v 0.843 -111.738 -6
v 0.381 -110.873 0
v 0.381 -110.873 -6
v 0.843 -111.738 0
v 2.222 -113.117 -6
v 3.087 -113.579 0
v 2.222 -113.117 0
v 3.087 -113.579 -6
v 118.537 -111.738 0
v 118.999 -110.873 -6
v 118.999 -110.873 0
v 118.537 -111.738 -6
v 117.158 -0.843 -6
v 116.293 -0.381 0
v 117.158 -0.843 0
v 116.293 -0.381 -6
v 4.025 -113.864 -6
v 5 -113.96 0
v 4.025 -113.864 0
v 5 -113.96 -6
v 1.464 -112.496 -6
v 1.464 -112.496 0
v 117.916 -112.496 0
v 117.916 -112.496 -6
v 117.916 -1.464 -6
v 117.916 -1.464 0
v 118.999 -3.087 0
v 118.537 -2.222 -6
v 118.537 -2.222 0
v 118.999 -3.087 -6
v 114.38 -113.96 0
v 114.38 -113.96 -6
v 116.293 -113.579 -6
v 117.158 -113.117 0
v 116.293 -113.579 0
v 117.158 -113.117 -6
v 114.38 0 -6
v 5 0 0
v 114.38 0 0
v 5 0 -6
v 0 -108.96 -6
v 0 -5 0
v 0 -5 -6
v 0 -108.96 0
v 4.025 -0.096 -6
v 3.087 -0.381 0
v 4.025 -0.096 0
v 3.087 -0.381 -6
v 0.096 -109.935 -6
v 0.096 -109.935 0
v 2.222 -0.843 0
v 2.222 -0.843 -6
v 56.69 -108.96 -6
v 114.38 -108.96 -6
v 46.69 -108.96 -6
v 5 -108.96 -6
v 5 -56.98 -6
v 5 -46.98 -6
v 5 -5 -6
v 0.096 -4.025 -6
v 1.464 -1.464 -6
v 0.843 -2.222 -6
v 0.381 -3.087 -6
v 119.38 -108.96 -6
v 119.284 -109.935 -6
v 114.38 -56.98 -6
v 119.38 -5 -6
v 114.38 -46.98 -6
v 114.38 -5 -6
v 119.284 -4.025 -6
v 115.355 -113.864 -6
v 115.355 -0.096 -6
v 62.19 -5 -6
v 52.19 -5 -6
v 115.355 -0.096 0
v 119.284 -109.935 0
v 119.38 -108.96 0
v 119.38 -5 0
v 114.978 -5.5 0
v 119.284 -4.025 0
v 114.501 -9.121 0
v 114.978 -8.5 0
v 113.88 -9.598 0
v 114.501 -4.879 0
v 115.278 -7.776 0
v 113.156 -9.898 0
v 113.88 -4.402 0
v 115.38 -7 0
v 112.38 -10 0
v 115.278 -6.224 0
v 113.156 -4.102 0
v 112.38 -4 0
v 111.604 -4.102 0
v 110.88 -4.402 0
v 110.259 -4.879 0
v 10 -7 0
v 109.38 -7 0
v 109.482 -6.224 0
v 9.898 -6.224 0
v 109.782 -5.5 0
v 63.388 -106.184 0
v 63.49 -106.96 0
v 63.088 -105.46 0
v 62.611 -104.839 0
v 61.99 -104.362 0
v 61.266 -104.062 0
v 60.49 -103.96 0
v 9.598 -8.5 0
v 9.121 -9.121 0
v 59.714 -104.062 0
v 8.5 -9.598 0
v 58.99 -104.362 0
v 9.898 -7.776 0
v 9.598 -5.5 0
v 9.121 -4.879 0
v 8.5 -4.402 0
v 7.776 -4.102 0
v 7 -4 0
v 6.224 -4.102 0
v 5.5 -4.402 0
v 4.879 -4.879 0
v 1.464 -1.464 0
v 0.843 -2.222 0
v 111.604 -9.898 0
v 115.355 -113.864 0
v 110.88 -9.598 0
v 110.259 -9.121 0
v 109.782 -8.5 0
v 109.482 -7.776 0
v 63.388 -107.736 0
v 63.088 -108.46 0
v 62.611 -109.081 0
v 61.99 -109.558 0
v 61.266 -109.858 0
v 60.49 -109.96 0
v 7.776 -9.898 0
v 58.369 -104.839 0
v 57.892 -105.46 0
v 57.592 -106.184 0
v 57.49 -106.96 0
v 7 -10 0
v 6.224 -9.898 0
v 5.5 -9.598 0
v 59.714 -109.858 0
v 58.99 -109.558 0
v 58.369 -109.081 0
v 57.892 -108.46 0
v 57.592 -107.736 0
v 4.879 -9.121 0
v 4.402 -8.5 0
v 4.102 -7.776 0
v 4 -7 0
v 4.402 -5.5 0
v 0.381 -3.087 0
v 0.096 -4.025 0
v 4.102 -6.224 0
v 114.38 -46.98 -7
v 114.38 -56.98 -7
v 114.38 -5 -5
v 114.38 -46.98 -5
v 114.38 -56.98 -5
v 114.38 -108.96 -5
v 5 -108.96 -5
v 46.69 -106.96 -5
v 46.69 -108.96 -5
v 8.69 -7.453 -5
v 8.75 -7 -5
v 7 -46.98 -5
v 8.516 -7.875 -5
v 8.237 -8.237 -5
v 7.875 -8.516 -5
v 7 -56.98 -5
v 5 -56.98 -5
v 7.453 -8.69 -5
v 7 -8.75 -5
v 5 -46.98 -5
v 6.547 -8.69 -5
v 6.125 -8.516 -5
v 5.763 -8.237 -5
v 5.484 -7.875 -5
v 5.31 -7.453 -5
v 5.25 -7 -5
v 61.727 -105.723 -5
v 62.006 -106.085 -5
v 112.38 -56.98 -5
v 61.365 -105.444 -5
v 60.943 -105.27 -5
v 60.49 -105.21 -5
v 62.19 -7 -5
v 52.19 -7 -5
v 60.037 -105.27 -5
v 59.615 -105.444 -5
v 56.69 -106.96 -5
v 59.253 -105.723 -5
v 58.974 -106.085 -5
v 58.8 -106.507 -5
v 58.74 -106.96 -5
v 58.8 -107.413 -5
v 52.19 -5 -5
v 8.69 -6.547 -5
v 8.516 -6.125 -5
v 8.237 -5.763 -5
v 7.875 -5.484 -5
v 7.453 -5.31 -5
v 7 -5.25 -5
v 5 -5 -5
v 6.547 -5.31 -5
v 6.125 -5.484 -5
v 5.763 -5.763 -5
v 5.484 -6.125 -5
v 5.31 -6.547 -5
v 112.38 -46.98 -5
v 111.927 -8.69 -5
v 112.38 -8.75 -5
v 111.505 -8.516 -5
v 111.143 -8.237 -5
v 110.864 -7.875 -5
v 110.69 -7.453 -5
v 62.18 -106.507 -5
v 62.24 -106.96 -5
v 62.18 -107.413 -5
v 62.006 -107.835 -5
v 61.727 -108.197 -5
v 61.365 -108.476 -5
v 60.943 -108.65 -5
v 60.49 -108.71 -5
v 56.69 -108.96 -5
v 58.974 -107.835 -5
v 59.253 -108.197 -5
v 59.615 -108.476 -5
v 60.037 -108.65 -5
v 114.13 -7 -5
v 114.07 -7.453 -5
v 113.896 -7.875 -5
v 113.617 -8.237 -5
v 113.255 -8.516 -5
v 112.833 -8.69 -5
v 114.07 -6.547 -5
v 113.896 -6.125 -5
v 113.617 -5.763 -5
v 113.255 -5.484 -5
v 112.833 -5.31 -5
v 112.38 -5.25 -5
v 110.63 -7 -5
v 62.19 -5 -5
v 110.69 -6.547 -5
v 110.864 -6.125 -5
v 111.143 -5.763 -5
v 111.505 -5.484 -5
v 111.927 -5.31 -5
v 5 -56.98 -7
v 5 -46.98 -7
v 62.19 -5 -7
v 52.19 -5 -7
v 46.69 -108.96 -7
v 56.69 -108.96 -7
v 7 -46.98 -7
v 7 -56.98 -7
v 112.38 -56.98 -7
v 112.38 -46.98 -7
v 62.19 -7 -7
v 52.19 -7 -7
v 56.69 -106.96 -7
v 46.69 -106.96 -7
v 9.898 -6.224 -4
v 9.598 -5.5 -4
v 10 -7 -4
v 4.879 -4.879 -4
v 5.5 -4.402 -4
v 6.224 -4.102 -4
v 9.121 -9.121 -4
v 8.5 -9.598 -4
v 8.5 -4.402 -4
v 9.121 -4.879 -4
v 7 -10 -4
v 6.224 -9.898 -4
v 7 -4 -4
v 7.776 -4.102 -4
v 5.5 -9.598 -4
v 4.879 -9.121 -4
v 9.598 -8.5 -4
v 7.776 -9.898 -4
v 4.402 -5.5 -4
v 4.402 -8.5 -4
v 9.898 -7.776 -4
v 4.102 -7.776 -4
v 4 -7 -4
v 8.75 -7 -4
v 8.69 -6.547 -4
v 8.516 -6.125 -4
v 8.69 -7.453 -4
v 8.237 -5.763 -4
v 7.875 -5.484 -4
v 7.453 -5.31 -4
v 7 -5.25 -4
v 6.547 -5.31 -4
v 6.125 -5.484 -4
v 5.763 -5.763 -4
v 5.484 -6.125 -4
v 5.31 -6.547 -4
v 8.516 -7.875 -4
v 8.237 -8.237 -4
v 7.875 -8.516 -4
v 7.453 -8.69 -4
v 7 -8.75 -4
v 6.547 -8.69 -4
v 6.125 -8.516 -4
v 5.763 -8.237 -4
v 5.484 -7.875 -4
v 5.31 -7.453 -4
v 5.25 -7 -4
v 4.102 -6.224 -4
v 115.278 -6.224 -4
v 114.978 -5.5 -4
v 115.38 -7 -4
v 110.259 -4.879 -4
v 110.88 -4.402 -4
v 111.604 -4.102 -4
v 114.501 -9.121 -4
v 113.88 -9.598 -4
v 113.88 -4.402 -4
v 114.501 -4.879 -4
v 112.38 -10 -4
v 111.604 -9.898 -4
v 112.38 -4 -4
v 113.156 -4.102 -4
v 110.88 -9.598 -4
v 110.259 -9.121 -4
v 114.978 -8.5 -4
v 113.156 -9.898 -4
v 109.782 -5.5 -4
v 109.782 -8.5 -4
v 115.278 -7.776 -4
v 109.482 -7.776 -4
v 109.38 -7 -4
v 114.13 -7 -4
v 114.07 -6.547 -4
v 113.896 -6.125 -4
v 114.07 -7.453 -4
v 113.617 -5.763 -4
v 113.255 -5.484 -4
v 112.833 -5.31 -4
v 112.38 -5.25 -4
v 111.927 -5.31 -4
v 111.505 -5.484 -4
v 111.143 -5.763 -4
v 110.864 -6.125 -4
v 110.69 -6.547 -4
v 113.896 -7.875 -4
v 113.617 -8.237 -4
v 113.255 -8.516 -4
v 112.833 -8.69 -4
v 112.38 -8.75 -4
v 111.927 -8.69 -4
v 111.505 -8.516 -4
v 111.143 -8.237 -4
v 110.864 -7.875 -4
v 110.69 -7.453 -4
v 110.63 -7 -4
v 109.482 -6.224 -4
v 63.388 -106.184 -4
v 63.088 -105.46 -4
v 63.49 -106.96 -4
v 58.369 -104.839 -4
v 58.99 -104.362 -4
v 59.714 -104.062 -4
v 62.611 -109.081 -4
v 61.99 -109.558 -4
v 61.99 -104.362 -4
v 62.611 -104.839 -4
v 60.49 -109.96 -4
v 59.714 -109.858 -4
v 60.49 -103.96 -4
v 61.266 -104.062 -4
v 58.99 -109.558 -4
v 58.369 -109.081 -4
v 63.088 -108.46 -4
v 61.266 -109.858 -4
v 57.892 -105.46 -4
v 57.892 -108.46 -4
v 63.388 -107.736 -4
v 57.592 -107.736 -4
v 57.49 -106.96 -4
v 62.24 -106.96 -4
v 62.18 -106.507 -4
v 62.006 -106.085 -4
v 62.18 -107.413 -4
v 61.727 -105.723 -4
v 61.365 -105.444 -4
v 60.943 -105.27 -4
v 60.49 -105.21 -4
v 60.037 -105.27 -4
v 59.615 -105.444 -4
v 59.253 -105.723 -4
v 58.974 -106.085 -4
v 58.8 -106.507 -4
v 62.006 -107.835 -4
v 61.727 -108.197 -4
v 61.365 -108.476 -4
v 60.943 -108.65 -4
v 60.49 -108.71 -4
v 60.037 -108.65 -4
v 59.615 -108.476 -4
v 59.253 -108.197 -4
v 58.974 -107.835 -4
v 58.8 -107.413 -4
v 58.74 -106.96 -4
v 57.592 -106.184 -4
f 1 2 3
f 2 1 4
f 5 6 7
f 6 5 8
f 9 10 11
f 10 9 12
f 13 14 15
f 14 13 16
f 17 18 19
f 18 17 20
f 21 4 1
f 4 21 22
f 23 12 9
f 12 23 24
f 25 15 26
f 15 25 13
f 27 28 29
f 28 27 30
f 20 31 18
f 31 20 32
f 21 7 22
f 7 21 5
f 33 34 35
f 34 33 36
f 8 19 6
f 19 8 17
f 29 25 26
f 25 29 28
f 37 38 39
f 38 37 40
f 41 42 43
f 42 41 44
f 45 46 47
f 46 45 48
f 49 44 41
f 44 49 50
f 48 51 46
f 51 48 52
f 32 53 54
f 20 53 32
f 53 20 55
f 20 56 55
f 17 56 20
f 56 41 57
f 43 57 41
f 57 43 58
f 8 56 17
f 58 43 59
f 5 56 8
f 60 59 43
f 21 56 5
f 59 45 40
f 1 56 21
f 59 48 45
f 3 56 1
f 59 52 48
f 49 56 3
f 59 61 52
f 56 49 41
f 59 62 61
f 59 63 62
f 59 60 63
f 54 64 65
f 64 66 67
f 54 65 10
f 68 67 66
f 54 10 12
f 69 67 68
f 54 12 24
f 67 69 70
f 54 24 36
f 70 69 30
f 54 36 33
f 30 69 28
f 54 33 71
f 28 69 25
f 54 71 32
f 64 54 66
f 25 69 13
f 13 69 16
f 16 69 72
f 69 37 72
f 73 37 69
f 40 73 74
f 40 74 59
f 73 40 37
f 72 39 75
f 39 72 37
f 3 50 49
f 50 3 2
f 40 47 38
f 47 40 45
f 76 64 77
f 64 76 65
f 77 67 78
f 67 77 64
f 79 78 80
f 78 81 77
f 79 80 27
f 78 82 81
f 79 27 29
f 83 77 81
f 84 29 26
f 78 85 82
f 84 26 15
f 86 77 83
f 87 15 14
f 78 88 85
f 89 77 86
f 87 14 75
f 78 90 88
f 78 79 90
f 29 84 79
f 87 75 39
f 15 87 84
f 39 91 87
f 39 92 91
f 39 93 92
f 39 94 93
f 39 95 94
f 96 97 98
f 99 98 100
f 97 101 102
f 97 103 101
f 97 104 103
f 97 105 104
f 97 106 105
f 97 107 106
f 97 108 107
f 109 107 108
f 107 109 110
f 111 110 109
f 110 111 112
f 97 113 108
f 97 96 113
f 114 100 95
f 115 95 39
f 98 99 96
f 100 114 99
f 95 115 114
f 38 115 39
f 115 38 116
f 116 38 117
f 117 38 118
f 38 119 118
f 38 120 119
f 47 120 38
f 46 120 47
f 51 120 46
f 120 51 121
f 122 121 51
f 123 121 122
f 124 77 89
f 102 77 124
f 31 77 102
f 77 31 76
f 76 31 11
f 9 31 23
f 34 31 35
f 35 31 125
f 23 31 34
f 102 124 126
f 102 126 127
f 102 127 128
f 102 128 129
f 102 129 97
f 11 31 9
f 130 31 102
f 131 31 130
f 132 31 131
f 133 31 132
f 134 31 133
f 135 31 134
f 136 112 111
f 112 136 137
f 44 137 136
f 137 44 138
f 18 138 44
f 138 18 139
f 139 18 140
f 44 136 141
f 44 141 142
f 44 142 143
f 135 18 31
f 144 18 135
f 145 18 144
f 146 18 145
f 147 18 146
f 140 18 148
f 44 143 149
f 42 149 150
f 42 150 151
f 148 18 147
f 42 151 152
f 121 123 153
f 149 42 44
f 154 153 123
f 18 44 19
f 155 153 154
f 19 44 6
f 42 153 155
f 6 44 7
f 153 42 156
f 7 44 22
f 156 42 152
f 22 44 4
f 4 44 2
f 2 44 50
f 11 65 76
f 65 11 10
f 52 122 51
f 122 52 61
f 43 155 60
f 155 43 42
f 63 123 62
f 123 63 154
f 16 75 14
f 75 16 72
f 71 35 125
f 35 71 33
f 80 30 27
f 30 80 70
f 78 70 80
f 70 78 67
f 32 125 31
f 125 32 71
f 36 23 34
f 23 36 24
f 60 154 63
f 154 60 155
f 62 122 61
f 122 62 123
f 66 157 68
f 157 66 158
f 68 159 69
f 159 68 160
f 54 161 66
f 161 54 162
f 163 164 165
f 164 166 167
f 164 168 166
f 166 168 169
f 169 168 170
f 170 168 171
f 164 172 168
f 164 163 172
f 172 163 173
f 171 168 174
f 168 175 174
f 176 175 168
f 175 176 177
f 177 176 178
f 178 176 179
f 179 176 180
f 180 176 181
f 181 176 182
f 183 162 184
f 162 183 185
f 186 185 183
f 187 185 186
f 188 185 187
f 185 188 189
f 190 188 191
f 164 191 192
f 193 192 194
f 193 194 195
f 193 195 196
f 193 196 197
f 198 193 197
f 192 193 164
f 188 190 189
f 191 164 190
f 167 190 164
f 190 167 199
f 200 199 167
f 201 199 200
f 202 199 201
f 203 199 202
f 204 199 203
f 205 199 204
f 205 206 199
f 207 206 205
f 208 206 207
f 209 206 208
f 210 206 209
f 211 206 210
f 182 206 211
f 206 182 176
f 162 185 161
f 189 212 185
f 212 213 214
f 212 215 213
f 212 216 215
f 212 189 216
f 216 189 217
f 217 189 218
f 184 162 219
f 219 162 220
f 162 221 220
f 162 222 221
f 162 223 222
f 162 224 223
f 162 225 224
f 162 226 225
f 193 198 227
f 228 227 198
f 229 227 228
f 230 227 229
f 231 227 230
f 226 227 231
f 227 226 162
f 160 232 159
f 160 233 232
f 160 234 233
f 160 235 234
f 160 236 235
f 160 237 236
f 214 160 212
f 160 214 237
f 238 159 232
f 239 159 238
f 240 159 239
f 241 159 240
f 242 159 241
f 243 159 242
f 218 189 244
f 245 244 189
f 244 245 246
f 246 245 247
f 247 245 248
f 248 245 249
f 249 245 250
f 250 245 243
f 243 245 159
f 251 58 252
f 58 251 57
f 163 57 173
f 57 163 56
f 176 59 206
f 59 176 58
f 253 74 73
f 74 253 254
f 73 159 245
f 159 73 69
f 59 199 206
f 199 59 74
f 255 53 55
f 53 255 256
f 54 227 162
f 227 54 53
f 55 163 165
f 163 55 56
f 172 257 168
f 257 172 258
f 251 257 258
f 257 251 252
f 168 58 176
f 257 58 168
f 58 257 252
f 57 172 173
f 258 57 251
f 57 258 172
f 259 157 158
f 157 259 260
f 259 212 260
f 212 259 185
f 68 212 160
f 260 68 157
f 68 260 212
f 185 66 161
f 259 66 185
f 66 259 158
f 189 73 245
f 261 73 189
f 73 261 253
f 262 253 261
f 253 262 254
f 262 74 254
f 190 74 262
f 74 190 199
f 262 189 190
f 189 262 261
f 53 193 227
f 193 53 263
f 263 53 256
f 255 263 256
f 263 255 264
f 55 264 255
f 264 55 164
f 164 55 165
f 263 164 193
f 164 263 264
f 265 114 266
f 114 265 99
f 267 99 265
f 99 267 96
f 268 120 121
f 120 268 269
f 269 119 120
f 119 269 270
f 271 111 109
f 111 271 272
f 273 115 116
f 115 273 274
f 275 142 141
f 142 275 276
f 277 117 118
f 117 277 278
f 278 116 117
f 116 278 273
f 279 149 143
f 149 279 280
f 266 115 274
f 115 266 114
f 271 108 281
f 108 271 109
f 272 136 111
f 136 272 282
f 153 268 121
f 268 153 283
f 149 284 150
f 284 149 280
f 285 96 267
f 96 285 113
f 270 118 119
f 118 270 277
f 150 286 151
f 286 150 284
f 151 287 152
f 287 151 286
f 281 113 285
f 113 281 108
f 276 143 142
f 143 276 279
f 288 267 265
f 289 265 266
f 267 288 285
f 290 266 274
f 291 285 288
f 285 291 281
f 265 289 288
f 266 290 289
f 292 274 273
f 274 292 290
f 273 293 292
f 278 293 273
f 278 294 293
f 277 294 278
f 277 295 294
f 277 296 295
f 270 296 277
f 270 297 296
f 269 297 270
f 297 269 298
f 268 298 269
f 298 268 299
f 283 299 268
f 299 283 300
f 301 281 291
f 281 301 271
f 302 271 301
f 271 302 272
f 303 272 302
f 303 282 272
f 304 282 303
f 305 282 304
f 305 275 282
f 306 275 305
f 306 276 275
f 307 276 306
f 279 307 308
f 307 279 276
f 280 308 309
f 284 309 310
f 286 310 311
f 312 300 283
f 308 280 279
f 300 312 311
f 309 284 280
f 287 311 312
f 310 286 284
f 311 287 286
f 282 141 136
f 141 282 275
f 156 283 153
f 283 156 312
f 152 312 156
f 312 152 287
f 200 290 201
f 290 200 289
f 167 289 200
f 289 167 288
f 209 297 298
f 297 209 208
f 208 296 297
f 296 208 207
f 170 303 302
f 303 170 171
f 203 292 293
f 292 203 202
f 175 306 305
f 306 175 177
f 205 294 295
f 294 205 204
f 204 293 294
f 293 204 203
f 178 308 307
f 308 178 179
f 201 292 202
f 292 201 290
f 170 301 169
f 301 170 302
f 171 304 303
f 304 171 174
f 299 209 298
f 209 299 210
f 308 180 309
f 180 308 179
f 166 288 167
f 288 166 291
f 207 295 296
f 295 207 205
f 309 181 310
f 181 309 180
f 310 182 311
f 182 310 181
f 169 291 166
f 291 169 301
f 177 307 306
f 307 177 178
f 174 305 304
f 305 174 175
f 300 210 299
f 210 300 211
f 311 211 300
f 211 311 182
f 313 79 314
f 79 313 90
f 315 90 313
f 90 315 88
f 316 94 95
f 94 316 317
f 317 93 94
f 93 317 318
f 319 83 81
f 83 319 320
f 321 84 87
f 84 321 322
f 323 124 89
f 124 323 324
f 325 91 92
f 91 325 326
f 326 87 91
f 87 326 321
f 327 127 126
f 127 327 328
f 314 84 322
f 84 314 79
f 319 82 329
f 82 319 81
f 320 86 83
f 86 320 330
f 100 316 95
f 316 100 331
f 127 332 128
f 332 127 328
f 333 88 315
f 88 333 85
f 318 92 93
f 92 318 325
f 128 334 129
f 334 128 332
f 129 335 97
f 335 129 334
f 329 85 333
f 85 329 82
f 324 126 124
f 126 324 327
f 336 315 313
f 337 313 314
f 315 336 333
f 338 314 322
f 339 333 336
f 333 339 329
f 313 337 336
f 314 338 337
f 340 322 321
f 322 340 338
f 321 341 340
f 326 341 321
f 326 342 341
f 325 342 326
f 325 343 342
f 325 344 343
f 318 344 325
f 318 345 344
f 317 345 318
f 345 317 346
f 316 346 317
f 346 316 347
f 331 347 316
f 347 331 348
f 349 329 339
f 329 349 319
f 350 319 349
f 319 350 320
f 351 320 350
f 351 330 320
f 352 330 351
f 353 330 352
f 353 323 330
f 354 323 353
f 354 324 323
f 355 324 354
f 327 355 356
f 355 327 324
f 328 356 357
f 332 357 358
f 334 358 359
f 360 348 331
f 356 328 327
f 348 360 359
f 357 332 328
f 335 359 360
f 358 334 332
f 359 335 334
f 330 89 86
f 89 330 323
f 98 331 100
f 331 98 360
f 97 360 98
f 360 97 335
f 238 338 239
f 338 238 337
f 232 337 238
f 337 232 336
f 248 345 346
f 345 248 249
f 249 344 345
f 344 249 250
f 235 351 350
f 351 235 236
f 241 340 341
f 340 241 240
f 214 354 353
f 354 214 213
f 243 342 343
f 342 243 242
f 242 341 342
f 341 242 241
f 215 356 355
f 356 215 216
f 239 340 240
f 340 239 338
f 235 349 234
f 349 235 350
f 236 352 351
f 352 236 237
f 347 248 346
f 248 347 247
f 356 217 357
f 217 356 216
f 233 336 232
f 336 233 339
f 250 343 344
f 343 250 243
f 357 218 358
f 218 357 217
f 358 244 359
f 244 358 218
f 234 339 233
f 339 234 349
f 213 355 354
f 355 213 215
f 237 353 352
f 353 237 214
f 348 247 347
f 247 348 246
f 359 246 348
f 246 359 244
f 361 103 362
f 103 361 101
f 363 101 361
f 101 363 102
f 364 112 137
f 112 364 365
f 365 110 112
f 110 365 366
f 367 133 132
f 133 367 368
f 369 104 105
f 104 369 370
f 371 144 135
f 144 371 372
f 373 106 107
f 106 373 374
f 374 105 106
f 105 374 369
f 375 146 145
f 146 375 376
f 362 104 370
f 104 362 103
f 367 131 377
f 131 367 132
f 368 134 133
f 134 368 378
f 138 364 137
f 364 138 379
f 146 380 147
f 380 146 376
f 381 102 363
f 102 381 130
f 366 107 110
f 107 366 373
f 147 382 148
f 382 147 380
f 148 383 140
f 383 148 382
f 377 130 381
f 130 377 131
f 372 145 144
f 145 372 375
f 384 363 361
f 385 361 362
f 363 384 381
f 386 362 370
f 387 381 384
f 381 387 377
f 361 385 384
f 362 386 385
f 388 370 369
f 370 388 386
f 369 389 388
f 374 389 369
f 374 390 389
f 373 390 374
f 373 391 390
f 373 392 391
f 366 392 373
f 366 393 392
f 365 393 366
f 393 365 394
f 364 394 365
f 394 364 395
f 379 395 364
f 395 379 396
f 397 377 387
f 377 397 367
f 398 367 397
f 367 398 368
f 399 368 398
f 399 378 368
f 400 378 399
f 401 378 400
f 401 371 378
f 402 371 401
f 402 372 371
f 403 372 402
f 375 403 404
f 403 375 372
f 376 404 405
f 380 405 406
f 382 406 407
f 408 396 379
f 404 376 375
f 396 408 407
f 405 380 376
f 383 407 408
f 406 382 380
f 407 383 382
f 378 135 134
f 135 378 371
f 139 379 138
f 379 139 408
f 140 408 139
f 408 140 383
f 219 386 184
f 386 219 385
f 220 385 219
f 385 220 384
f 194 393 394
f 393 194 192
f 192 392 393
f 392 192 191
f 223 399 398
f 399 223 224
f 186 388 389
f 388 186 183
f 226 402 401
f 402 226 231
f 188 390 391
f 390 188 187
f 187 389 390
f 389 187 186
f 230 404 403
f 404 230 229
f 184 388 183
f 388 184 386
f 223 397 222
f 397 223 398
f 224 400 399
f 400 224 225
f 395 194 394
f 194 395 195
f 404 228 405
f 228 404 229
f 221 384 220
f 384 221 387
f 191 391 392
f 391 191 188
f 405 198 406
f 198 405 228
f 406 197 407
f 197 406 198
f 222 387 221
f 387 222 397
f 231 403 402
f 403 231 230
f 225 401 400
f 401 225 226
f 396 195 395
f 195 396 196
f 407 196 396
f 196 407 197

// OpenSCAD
// 12/1/24 - Tested compomnent size and spacing and it is good.
// Next steps:
//  - Add labels? No, do those with color.
//  - Holes for Nano mount - test
//  - Hole for Nano USB
//  - Holes to mount back plate

hr = 5;          // Corner radius of box
hull_fn = 32;  // fn for box corner

c = 25.4;
b = .5 * c;
x1 = .45 * c;
x2 = .7 * c;
x3 = .2 * c;   // Second row M3
y1 = .3 * c;
y2 = .6 * c;
y3 = .9 * c;  // Second row M3
y4 = 18;     // switches and pots

xt = b + x1 + 4*x2 + x1 + b - 2*hr;
yt = b + y1 + y2 + y4 + b - 2*hr  + 5 + 30 + b;

//m3 = 3.5;
scr = 2.8;   // mounting screw hole 2.6 is too small. 1/8" (real, 3.18mm) is too big
bd = 12;   // button diameter

fpt1 = 6; // front piece thickness 18 should be ok
fpt2 = 5; // front plate thickness

bbh = 8; // button board mounting height 
nh  = 5; // nano mounting height

m3id = 4;  // M3 insert diameter
m3ih = 6;  // M3 insert height

module m3i(td){
    difference() {
        cylinder(d=m3id+3, h=td, $fn=32);
        translate([0,0,td-m3ih]) cylinder(d=m3id, h=m3ih, $fn=32);
    }
}

module boxtop(btX,btY,btZ) {
translate([hr,hr,0])
    hull() {
        cylinder(r=hr, btZ, $fn = hull_fn);
        translate([btX,0,0]) cylinder(r=hr, btZ, $fn = hull_fn);
        translate([btX,btY,0]) cylinder(r=hr, btZ, $fn = hull_fn);
        translate([0,btY,0]) cylinder(r=hr, btZ, $fn = hull_fn);
    }
}

module m3bolt() {
    cylinder(d=6, h=4, $fn=24);
    cylinder(d=3.5, h=20, $fn=24);
}

mirror([0,0,1])
difference() {
    union() {
        difference() {
            translate([0,-yt-2*hr,0]) boxtop(xt,yt,fpt1);
            // Carve out interior
            translate([(xt+2*hr)/2,(-yt-2*hr)/2,fpt1/2+fpt2]) cube([xt,yt,fpt1], center=true);
        }
        m1x = b-2*hr+4;
        m1y = b+y1+y2;
        // side tabs
        translate([hr,-yt/2-hr,fpt2]) cube([2,10,fpt1-fpt2+1]);
        translate([xt+hr-2,-yt/2-hr,fpt2]) cube([2,10,fpt1-fpt2+1]);
        // top tab
        translate([xt/2-hr/2,-2-hr,fpt2]) cube([10,2,fpt1-fpt2+1]);
        // bottom tab
        translate([xt/2-8,-yt-hr,fpt2]) cube([10,2,fpt1-fpt2+1]);
    }
    translate([hr+2,-hr-2,0]) m3bolt();
    translate([xt+hr-2,-hr-2,0]) m3bolt();
    translate([xt/2+5.8,-yt-hr+2,0]) m3bolt();
    // blockouts to test
    //translate([0,-80,0]) cube([150,80,30]);
    //translate([70,-120,0]) cube([150,120,30]);
}
